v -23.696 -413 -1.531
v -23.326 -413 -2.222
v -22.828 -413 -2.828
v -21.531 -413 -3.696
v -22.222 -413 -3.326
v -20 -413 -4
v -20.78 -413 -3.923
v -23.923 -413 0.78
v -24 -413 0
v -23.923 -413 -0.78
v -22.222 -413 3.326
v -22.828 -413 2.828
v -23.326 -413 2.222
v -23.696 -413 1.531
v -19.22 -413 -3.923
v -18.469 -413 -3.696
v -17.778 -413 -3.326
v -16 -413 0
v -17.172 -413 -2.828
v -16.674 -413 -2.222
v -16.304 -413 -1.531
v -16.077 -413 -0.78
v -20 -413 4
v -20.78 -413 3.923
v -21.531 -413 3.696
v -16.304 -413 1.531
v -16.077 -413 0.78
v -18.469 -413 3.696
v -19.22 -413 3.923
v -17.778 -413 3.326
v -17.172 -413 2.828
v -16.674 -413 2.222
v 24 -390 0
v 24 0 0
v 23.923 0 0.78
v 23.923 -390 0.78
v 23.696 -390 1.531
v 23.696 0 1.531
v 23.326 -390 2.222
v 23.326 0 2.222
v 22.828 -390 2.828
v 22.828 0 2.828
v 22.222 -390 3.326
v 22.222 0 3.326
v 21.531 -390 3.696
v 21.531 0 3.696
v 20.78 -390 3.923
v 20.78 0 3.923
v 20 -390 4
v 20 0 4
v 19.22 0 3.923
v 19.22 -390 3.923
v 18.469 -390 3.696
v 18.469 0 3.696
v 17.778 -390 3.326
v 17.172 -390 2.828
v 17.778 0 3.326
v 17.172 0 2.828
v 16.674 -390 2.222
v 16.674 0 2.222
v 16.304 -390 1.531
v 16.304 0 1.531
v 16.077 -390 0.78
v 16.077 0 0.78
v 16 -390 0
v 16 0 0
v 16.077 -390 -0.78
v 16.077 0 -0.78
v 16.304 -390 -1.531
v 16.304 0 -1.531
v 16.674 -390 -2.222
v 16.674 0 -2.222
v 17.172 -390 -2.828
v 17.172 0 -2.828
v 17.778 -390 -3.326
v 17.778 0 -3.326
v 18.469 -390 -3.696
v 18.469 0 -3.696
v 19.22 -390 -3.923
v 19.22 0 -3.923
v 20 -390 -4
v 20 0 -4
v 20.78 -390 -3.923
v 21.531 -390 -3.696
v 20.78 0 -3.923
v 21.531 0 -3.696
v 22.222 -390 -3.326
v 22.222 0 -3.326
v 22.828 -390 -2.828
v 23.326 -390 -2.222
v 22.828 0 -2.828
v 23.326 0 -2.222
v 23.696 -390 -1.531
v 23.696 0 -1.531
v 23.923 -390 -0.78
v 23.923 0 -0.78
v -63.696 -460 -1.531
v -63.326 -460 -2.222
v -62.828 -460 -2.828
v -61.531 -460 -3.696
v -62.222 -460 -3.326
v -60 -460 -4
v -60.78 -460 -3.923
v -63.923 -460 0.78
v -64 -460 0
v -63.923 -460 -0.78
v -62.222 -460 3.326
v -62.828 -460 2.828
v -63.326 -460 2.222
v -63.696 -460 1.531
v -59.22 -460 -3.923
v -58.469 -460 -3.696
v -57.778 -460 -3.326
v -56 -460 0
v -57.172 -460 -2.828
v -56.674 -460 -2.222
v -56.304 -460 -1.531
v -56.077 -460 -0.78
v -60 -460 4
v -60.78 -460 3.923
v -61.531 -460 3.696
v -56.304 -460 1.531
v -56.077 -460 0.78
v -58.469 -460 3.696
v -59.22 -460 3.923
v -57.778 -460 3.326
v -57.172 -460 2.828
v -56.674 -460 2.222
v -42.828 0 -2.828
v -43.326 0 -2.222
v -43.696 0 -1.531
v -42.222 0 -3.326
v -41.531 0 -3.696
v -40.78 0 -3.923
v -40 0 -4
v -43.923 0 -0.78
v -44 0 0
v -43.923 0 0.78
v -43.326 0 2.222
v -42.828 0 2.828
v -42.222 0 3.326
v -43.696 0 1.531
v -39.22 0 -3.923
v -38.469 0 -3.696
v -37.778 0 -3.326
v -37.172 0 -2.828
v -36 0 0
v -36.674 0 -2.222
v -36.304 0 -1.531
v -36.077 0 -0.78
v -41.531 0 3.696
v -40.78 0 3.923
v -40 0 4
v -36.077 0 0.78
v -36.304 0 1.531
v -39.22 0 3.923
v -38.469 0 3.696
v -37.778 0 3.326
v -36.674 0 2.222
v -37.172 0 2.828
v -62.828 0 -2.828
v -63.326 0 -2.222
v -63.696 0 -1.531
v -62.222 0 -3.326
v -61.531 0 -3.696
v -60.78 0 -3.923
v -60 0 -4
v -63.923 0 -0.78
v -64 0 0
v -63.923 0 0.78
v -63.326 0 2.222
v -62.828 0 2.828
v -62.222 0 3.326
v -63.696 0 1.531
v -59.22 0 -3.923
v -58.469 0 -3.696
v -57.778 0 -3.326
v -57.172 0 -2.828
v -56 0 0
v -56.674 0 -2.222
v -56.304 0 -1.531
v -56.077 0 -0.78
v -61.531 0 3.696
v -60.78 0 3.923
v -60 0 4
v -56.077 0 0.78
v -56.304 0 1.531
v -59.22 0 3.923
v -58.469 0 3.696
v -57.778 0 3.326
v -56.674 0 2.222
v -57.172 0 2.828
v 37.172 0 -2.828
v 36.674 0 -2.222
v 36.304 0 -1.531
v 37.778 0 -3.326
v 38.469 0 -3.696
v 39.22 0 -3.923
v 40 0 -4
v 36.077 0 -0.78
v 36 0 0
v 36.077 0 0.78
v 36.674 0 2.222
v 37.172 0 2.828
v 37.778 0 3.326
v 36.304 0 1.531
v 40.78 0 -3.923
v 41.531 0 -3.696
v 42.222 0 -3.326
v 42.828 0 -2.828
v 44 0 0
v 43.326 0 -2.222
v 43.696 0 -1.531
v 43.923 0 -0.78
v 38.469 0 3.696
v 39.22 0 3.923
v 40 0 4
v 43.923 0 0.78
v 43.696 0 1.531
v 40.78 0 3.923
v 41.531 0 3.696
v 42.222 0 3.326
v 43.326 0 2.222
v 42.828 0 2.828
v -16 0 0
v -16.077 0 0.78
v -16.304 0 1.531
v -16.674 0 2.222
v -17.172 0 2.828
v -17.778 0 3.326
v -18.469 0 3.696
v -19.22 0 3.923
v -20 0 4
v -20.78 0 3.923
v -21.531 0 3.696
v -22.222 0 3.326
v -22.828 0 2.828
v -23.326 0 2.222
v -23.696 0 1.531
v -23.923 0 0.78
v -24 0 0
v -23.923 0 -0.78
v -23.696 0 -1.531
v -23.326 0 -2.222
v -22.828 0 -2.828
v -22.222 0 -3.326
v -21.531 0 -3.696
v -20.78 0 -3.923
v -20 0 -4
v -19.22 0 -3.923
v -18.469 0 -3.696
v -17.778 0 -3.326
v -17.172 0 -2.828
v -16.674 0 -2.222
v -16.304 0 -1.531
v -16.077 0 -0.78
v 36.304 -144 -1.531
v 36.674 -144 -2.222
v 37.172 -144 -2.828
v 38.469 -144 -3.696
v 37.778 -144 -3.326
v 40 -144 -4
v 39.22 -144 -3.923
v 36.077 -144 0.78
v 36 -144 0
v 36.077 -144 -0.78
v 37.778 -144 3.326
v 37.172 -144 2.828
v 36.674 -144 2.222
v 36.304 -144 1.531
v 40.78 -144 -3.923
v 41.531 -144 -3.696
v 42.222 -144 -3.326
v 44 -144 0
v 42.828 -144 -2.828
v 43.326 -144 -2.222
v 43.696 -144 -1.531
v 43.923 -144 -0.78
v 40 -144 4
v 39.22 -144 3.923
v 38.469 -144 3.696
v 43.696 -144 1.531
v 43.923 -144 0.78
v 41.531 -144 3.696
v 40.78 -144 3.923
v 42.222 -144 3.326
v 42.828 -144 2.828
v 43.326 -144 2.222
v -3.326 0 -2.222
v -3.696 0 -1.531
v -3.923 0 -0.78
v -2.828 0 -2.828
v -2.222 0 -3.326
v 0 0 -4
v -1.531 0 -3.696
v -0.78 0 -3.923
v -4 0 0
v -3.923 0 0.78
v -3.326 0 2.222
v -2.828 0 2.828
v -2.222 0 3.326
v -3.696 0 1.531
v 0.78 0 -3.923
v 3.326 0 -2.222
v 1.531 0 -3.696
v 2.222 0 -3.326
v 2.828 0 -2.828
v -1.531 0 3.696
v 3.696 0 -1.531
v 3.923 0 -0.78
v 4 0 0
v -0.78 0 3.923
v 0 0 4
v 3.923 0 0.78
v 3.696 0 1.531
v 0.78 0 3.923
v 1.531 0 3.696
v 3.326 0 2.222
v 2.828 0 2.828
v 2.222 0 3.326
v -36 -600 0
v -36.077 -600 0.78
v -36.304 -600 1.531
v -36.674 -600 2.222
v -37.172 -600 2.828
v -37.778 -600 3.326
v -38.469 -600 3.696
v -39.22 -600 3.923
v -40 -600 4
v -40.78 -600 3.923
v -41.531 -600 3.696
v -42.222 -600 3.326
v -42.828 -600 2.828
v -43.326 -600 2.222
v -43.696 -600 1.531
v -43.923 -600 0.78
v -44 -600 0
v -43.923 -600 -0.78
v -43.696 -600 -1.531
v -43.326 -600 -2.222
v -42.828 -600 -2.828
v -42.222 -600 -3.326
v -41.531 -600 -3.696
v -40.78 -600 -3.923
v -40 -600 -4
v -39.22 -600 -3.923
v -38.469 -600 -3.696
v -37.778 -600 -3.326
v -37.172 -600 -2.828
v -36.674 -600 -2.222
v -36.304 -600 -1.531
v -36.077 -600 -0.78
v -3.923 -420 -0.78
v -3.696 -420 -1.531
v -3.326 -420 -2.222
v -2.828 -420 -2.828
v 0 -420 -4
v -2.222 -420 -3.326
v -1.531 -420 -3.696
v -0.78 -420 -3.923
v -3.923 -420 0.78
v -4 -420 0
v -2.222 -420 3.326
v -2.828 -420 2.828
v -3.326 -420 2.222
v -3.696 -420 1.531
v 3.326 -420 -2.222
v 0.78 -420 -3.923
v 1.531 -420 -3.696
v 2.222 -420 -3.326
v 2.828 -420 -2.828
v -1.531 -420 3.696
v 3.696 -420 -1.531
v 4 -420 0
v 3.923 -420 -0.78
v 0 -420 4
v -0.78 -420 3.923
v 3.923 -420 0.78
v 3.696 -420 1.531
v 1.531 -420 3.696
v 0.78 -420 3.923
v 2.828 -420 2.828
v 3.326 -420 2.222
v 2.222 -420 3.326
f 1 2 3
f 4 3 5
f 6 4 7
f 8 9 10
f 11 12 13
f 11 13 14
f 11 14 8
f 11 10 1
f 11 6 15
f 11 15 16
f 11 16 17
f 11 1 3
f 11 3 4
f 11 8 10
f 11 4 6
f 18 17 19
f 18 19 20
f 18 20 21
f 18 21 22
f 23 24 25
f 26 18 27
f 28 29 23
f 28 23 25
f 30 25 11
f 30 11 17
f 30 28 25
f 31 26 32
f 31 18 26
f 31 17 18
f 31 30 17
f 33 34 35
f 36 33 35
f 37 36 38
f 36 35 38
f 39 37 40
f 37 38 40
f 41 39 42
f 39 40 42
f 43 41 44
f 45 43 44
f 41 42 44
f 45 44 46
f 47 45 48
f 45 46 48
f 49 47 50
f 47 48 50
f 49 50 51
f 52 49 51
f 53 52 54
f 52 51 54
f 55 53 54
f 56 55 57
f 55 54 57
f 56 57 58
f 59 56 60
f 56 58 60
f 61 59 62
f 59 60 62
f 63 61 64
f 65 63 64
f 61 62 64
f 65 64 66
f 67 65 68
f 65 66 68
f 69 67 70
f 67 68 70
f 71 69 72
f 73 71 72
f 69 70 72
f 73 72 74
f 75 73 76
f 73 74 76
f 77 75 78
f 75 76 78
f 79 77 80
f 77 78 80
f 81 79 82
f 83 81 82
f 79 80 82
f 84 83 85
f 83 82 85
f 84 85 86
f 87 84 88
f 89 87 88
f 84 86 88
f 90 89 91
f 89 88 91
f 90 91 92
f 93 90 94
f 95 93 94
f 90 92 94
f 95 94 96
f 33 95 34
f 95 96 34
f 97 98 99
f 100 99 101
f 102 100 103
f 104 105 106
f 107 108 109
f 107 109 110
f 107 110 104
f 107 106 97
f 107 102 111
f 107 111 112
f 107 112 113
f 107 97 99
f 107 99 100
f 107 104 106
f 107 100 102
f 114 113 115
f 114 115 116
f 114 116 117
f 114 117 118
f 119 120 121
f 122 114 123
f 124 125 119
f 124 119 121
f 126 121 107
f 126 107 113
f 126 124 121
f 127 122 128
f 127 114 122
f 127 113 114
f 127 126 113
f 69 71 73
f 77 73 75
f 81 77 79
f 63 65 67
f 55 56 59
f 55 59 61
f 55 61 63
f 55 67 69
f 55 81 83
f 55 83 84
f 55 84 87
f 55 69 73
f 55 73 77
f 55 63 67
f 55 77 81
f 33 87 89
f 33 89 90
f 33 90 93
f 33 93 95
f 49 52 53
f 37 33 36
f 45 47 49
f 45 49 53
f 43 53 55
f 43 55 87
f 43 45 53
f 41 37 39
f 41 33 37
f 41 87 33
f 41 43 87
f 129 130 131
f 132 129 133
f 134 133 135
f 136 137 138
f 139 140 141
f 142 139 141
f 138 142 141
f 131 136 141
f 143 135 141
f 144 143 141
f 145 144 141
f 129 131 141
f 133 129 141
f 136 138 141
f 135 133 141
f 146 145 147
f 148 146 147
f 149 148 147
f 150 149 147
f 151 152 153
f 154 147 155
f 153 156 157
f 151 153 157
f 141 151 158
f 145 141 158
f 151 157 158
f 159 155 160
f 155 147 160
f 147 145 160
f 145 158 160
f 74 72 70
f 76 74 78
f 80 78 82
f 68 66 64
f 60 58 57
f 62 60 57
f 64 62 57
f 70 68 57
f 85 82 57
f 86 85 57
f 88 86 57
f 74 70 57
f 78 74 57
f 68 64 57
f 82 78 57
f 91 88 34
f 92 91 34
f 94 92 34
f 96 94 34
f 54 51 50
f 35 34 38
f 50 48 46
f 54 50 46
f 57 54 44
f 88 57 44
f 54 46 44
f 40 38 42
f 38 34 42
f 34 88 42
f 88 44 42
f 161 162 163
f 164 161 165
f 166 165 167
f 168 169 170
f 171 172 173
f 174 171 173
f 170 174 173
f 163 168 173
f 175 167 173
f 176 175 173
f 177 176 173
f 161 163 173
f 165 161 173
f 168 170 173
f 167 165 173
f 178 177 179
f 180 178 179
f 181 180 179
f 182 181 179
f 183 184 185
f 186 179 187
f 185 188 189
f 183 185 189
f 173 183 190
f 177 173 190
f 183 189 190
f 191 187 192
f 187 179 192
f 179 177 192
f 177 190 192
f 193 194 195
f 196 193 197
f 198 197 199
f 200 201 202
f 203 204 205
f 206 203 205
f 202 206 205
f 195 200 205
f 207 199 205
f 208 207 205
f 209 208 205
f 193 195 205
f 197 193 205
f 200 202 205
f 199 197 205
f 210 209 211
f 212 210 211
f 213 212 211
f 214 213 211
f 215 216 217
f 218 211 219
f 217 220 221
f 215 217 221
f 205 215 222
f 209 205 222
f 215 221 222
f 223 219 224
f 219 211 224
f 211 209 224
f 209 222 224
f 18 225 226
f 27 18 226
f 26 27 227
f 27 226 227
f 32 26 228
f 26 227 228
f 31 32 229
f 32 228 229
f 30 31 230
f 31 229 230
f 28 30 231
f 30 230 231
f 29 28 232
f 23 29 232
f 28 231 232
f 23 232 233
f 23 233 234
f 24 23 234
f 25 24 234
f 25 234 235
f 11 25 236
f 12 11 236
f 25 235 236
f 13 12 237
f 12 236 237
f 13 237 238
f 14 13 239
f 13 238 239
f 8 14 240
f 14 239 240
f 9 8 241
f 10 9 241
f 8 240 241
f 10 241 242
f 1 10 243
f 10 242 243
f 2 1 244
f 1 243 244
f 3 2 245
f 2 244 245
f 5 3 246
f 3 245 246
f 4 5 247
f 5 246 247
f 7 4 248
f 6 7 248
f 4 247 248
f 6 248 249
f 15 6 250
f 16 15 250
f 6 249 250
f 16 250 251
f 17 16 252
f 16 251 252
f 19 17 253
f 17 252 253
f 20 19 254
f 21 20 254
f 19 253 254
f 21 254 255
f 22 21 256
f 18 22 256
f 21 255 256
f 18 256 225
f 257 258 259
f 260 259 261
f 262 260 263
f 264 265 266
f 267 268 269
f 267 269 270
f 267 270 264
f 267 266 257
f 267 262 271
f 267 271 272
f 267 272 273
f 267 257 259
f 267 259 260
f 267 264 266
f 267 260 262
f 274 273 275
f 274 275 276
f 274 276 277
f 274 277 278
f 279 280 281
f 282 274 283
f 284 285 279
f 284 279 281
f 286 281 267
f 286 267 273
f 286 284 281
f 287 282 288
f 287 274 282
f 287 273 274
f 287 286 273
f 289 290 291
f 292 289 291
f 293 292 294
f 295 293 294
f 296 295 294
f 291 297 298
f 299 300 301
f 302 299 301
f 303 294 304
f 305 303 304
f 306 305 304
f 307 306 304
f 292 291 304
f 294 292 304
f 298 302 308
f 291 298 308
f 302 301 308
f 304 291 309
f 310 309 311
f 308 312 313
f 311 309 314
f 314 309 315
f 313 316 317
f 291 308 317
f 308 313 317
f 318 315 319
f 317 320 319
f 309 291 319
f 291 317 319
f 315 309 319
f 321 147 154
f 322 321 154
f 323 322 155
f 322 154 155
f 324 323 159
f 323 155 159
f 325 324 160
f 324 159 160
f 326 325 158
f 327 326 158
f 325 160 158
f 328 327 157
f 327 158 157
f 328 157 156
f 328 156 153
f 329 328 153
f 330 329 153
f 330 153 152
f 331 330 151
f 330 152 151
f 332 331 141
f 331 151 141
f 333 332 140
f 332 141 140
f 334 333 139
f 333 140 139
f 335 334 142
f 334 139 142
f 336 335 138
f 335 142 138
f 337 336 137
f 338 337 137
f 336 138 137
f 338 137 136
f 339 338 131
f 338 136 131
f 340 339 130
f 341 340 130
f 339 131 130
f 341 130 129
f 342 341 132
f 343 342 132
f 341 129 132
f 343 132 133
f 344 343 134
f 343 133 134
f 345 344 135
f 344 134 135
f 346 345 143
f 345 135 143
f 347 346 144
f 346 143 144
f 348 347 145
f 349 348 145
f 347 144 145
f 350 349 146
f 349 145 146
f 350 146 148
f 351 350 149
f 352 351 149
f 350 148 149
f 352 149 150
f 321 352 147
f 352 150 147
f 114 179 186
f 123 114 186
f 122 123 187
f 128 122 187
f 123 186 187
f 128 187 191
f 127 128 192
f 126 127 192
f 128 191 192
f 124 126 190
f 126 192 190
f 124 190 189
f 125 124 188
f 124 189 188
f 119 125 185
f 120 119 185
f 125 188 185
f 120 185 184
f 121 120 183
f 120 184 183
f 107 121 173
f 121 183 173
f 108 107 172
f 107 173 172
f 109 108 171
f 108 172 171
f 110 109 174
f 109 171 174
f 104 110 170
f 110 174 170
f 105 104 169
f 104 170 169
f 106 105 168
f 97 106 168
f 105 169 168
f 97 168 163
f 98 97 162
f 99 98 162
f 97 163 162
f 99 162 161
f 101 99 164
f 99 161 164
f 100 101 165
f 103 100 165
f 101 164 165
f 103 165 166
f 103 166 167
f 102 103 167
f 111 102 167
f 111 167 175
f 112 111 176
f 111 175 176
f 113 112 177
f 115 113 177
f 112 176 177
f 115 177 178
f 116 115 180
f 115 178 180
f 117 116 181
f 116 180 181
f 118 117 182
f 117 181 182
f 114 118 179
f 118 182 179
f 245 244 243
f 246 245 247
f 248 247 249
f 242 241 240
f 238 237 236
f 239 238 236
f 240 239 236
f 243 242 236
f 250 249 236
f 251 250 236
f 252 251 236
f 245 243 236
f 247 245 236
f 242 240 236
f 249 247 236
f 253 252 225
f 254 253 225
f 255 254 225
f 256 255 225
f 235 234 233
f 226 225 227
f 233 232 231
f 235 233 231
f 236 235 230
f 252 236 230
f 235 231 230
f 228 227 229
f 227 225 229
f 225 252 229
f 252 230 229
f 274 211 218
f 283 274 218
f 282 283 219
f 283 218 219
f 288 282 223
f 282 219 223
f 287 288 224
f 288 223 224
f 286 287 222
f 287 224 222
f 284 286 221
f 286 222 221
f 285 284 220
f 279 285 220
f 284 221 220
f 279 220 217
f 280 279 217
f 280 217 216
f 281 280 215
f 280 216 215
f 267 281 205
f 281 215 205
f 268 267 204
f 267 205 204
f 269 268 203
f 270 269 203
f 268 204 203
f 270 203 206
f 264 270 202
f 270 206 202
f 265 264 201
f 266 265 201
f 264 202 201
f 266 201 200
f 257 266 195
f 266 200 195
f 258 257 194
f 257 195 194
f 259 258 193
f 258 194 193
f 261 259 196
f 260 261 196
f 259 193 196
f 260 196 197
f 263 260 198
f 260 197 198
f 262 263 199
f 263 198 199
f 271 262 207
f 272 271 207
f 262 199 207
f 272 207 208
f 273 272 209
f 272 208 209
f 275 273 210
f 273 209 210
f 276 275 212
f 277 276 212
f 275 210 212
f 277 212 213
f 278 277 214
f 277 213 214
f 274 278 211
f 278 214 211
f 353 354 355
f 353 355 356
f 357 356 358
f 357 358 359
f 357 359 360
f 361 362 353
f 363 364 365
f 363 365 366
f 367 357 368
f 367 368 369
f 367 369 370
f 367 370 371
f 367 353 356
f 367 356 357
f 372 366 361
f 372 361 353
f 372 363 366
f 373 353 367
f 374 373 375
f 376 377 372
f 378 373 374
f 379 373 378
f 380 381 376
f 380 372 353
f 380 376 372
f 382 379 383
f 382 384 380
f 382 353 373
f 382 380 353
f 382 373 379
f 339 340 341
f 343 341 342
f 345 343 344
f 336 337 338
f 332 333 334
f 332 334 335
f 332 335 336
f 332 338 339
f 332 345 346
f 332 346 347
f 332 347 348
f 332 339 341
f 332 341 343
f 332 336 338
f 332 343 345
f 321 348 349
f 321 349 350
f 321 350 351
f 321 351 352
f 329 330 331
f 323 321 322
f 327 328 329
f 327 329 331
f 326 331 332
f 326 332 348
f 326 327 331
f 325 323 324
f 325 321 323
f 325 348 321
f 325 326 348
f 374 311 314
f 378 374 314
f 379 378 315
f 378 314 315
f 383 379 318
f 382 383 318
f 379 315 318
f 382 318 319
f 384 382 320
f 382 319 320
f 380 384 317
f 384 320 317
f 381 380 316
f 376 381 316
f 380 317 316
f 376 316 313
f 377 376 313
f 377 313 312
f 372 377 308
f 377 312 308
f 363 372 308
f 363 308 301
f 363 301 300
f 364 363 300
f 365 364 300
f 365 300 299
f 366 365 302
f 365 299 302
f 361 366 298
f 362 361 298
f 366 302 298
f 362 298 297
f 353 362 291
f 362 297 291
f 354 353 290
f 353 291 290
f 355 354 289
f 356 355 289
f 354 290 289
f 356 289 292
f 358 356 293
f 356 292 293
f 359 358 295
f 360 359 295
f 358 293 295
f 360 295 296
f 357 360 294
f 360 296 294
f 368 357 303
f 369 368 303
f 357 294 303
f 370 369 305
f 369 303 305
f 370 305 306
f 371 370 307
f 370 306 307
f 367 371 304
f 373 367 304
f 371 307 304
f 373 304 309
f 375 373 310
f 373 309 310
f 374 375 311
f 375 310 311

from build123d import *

# Parameters (mm, degrees)
F0_R     = 4
F1_DEPTH = 420
F2_DEPTH = 390
F3_DEPTH = 413
F4_DEPTH = 600
F5_DEPTH = 460
F6_DEPTH = 144


with BuildPart() as f1:
    # F0 (on Front) → F1 (new body)
    with BuildSketch(Plane.XZ):
        Circle(F0_R)
    extrude(amount=F1_DEPTH)


with BuildPart() as f2:
    # F0 (on Front) → F2 (new body)
    with BuildSketch(Plane.XZ):
        with Locations((20, 0)):
            Circle(F0_R)
    extrude(amount=F2_DEPTH)


with BuildPart() as f3:
    # F0 (on Front) → F3 (new body)
    with BuildSketch(Plane.XZ):
        with Locations((-20, 0)):
            Circle(F0_R)
    extrude(amount=F3_DEPTH)


with BuildPart() as f4:
    # F0 (on Front) → F4 (new body)
    with BuildSketch(Plane.XZ):
        with Locations((-40, 0)):
            Circle(F0_R)
    extrude(amount=F4_DEPTH)


with BuildPart() as f5:
    # F0 (on Front) → F5 (new body)
    with BuildSketch(Plane.XZ):
        with Locations((-60, 0)):
            Circle(F0_R)
    extrude(amount=F5_DEPTH)


with BuildPart() as f6:
    # F0 (on Front) → F6 (new body)
    with BuildSketch(Plane.XZ):
        with Locations((40, 0)):
            Circle(F0_R)
    extrude(amount=F6_DEPTH)


solid = Compound([f1.part, f2.part, f3.part, f4.part, f5.part, f6.part])
